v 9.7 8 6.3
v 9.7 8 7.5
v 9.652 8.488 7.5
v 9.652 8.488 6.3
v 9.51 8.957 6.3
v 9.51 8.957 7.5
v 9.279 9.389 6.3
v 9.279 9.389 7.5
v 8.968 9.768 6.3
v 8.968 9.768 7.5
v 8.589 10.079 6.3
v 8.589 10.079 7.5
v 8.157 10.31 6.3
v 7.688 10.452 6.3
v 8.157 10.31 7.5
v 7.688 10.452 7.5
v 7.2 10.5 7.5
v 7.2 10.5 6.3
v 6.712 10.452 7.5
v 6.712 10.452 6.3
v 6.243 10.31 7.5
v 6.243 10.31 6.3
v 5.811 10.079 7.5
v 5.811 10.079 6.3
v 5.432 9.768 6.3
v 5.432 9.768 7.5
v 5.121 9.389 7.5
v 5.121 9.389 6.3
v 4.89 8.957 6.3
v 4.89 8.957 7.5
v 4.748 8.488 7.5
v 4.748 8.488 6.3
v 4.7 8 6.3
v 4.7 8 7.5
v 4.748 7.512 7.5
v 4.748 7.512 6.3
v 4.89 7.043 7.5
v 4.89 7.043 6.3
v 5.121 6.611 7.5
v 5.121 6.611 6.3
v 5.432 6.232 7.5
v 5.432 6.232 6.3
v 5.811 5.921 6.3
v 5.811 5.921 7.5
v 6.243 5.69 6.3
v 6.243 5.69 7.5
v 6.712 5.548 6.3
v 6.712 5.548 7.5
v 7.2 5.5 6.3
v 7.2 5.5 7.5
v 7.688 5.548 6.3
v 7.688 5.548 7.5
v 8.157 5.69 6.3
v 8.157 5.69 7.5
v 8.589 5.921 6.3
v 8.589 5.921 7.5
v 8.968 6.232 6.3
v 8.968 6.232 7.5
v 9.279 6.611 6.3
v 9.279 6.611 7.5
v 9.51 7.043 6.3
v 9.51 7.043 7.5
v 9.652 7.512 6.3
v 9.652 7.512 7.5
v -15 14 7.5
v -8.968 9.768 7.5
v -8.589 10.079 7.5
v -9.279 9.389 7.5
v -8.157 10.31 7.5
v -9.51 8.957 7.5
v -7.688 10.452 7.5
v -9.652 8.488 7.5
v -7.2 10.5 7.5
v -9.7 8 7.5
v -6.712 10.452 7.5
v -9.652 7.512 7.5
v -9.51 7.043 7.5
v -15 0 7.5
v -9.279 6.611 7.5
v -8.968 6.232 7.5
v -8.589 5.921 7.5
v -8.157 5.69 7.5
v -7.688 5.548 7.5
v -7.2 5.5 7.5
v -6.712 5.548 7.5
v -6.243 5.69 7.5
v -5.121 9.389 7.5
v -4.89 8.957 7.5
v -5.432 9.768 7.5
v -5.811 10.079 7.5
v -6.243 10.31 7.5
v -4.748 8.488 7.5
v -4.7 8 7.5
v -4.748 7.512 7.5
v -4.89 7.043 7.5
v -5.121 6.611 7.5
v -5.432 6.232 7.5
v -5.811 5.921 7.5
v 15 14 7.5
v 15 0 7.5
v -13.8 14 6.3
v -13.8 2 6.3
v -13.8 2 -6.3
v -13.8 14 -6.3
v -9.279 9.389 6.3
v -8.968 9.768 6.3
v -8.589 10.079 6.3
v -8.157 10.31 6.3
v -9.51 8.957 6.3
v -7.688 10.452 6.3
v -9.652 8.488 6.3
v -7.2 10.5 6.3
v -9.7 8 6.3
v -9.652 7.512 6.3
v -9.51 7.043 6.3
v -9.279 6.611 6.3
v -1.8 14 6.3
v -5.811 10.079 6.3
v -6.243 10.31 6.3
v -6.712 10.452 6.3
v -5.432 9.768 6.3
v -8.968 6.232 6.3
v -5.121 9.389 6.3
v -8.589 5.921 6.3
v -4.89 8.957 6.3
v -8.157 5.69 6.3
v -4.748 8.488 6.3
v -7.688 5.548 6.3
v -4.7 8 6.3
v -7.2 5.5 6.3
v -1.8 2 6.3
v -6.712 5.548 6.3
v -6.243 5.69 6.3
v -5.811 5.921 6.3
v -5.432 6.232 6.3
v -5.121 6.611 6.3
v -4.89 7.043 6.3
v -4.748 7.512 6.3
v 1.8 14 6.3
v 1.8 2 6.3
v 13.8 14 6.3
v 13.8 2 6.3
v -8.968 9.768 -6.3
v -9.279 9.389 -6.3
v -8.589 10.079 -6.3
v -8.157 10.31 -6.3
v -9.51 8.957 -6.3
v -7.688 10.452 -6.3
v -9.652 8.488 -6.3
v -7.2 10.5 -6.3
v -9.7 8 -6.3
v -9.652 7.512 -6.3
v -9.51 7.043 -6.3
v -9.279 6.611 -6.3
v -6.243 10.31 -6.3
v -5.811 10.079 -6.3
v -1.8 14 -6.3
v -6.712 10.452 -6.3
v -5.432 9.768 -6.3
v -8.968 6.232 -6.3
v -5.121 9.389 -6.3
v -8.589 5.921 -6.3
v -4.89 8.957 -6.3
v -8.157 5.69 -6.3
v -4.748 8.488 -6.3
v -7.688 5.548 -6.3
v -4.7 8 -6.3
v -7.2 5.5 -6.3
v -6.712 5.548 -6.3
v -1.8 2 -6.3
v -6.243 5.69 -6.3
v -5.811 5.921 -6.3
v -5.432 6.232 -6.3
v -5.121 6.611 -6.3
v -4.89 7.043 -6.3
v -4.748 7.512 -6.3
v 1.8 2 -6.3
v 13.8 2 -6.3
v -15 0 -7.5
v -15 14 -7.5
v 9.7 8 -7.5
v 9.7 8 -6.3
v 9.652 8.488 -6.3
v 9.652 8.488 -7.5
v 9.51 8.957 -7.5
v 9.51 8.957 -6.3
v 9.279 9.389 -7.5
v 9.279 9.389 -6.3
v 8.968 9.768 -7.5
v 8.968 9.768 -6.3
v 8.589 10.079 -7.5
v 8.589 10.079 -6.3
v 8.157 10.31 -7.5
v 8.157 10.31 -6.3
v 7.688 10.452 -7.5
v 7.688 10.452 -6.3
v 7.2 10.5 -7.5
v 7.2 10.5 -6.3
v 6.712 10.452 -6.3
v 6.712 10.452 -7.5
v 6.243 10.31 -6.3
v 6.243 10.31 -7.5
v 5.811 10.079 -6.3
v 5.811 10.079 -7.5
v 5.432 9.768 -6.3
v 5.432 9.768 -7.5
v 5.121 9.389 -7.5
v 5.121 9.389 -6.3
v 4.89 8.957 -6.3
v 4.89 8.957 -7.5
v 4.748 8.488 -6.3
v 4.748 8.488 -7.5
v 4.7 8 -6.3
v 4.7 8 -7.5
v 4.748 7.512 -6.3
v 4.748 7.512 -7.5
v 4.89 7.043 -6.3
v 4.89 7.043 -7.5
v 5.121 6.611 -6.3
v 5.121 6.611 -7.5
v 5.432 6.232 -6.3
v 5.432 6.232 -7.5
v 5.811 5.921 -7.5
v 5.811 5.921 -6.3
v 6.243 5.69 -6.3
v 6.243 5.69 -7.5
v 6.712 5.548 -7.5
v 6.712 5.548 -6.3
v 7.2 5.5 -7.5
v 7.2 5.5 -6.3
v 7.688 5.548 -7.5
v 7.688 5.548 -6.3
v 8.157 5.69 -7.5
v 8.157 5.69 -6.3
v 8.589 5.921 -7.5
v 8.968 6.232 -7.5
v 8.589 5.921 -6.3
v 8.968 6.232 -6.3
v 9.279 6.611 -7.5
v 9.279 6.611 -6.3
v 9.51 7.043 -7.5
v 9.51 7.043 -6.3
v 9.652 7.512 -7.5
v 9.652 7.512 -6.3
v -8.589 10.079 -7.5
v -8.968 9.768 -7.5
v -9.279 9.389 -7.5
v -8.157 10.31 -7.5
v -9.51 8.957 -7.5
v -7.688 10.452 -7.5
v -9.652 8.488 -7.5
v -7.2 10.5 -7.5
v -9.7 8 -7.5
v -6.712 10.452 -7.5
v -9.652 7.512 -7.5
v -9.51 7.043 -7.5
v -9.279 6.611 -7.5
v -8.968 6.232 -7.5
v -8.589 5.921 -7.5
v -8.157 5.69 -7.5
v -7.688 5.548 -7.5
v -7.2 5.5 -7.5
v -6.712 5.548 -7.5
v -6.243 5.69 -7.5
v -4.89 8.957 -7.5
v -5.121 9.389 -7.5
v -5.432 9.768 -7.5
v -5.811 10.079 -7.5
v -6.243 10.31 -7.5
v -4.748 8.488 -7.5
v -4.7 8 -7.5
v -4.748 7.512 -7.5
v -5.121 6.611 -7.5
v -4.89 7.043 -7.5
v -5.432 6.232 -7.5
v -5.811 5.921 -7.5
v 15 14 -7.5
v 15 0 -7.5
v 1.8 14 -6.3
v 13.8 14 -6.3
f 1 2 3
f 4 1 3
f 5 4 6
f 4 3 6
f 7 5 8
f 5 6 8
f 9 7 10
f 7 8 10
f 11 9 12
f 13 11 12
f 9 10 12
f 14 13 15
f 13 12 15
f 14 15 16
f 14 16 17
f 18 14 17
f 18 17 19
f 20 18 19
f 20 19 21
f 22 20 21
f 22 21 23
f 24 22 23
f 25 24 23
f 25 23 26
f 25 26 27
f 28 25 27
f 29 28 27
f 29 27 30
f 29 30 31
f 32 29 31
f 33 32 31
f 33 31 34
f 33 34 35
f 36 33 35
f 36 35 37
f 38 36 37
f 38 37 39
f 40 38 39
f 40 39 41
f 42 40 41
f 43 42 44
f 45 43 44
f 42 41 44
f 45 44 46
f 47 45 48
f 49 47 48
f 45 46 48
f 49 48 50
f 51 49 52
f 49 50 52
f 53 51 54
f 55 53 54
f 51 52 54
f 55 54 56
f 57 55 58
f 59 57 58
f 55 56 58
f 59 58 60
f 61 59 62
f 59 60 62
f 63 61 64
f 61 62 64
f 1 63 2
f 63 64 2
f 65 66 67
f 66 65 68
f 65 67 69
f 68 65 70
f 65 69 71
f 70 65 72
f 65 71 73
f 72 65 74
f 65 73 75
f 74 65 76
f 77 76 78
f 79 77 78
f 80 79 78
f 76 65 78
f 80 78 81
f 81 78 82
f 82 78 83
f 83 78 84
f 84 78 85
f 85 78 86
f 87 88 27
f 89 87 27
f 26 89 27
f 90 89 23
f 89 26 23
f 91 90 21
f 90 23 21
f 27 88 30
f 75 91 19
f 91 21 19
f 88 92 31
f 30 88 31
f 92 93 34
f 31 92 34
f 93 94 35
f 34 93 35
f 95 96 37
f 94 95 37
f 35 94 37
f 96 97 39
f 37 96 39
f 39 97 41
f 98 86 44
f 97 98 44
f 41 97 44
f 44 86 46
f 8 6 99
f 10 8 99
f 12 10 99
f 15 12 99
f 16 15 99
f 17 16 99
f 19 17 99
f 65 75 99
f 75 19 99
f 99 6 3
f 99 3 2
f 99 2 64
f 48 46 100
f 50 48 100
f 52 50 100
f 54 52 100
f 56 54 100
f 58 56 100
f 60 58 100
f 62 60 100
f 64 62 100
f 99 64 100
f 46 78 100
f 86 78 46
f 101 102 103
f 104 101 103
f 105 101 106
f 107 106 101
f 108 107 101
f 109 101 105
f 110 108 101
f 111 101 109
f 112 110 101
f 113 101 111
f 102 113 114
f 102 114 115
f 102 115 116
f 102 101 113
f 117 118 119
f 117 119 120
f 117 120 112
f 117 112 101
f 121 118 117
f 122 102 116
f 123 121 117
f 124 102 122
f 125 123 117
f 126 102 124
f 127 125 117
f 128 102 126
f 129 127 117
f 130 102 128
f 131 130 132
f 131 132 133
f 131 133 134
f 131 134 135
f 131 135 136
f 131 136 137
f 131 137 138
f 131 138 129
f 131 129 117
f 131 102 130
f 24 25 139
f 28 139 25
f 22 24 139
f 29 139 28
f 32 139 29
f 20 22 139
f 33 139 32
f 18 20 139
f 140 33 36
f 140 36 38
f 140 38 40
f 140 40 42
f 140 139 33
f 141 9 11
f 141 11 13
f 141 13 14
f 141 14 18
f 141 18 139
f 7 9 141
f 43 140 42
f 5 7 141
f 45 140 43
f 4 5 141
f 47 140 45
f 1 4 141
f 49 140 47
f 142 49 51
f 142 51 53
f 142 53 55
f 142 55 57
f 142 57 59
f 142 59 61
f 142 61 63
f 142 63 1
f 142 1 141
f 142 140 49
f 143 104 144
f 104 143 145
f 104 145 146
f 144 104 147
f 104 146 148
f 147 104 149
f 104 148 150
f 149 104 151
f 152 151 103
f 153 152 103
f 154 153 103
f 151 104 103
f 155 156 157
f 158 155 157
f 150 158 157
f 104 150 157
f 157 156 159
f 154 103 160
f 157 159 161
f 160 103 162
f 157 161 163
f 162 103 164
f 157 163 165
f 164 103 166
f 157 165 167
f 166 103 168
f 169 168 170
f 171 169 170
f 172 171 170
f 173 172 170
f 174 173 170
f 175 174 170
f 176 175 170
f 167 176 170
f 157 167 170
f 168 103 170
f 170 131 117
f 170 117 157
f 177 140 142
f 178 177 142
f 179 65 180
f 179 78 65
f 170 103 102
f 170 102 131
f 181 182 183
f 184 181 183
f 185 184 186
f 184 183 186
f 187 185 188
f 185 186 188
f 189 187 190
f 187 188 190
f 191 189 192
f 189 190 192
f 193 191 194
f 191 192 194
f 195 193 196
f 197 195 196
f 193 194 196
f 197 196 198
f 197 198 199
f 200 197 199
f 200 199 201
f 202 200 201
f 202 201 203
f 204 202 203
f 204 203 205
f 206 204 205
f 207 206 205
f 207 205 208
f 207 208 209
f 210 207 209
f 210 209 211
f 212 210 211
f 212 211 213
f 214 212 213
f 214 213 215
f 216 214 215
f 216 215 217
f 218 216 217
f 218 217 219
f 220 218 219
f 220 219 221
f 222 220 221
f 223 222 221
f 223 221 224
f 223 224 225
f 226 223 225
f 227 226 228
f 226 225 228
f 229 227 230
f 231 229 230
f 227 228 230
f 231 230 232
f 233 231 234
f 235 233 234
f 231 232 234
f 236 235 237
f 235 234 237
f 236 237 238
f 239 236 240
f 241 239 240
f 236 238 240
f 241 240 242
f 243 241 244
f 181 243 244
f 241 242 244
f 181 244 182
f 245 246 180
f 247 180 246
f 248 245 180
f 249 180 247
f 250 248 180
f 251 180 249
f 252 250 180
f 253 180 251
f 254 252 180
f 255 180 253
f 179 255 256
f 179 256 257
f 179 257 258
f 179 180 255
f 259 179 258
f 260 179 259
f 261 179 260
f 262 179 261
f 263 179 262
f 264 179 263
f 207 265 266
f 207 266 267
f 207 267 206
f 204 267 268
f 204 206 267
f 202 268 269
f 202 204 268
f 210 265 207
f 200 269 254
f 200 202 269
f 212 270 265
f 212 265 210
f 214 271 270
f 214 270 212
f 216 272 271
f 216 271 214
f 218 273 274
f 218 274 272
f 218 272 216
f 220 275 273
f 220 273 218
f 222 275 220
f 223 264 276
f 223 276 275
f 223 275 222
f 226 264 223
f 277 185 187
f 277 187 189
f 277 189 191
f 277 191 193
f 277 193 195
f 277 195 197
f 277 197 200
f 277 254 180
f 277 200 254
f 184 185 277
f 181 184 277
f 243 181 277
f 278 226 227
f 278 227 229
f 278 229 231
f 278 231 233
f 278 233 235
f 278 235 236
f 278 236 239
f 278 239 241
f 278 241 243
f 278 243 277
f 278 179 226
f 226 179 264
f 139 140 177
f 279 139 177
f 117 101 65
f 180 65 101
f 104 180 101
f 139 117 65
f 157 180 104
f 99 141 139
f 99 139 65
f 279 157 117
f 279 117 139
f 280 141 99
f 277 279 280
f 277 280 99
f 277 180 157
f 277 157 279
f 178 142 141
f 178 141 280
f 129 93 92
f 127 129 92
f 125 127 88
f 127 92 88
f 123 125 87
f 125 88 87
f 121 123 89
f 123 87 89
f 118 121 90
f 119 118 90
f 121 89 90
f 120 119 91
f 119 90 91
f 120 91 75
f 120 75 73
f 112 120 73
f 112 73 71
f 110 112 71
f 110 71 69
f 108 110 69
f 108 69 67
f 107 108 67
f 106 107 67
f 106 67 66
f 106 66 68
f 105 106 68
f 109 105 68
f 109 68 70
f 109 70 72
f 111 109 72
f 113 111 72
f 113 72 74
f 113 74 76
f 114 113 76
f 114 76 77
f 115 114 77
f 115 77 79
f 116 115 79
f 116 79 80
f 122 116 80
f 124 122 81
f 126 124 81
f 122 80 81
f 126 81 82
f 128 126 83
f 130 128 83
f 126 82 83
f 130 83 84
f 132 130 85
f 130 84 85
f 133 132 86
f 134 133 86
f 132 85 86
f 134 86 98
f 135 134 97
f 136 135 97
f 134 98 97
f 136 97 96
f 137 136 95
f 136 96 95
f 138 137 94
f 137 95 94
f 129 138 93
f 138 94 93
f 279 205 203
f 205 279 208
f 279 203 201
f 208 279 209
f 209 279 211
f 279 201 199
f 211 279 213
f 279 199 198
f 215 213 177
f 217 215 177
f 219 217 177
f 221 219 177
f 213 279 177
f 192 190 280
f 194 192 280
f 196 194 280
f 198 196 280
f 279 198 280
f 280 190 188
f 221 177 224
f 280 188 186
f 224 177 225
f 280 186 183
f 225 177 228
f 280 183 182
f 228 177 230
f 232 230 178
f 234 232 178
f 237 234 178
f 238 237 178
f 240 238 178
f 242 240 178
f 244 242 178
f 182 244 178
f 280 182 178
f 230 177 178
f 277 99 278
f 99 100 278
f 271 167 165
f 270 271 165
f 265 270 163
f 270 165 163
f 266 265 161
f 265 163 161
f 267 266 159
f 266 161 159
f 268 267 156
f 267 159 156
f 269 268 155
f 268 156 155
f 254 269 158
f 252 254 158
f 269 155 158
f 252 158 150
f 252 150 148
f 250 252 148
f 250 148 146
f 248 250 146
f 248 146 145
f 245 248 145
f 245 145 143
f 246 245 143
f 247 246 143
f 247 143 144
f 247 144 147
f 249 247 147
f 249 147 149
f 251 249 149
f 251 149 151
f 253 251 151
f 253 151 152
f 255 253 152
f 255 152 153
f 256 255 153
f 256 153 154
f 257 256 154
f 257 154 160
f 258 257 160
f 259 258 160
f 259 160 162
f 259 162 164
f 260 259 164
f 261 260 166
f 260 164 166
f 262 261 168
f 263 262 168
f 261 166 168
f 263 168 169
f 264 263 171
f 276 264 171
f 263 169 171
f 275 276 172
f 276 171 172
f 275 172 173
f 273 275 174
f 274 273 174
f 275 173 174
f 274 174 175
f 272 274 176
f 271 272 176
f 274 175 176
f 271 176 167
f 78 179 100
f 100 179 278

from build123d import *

# Parameters (mm, degrees)
SKETCH1_W           = 30
SKETCH1_H           = 15
BOSS_EXTRUDE1_DEPTH = 2
SKETCH2_W           = 1.2
SKETCH2_H           = 15
BOSS_EXTRUDE2_DEPTH = 12
SKETCH3_W           = 14.4
SKETCH3_H           = 15
SKETCH3_W_2         = 12
SKETCH3_H_2         = 12.6
BOSS_EXTRUDE3_DEPTH = 12
SKETCH4_R           = 2.5
CUT_EXTRUDE1_DEPTH  = 16
SKETCH5_W           = 14.4
SKETCH5_H           = 15
SKETCH5_W_2         = 12
SKETCH5_H_2         = 12.6
BOSS_EXTRUDE4_DEPTH = 12
SKETCH6_R           = 2.5
CUT_EXTRUDE2_DEPTH  = 16


with BuildPart() as part:
    # Sketch1 → Boss-Extrude1 (new body)
    with BuildSketch(Plane(origin=(0, 0, 0), x_dir=(1, 0, 0), z_dir=(0, 1, 0))):
        Rectangle(SKETCH1_W, SKETCH1_H)
    extrude(amount=BOSS_EXTRUDE1_DEPTH)

    # Sketch2 → Boss-Extrude2 (add)
    with BuildSketch(Plane(origin=(0, 2, 0), x_dir=(1, 0, 0), z_dir=(0, 1, 0))):
        Rectangle(SKETCH2_W, SKETCH2_H)
    extrude(amount=BOSS_EXTRUDE2_DEPTH)

    # Sketch3 → Boss-Extrude3 (add)
    with BuildSketch(Plane(origin=(0, 2, 0), x_dir=(1, 0, 0), z_dir=(0, 1, 0))):
        with Locations((7.8, 0)):
            Rectangle(SKETCH3_W, SKETCH3_H)
        with Locations((7.8, 0)):
            Rectangle(SKETCH3_W_2, SKETCH3_H_2, mode=Mode.SUBTRACT)
    extrude(amount=BOSS_EXTRUDE3_DEPTH)

    # Sketch4 → Cut-Extrude1 (cut)
    with BuildSketch(Plane.XY.offset(7.5)):
        with Locations((7.2, 8)):
            Circle(SKETCH4_R)
    extrude(amount=-CUT_EXTRUDE1_DEPTH, mode=Mode.SUBTRACT)

    # Sketch5 → Boss-Extrude4 (add)
    with BuildSketch(Plane(origin=(0, 2, 0), x_dir=(1, 0, 0), z_dir=(0, 1, 0))):
        with Locations((-7.8, 0)):
            Rectangle(SKETCH5_W, SKETCH5_H)
        with Locations((-7.8, 0)):
            Rectangle(SKETCH5_W_2, SKETCH5_H_2, mode=Mode.SUBTRACT)
    extrude(amount=BOSS_EXTRUDE4_DEPTH)

    # Sketch6 → Cut-Extrude2 (cut)
    with BuildSketch(Plane.XY.offset(7.5)):
        with Locations((-7.2, 8)):
            Circle(SKETCH6_R)
    extrude(amount=-CUT_EXTRUDE2_DEPTH, mode=Mode.SUBTRACT)


solid = part.part
